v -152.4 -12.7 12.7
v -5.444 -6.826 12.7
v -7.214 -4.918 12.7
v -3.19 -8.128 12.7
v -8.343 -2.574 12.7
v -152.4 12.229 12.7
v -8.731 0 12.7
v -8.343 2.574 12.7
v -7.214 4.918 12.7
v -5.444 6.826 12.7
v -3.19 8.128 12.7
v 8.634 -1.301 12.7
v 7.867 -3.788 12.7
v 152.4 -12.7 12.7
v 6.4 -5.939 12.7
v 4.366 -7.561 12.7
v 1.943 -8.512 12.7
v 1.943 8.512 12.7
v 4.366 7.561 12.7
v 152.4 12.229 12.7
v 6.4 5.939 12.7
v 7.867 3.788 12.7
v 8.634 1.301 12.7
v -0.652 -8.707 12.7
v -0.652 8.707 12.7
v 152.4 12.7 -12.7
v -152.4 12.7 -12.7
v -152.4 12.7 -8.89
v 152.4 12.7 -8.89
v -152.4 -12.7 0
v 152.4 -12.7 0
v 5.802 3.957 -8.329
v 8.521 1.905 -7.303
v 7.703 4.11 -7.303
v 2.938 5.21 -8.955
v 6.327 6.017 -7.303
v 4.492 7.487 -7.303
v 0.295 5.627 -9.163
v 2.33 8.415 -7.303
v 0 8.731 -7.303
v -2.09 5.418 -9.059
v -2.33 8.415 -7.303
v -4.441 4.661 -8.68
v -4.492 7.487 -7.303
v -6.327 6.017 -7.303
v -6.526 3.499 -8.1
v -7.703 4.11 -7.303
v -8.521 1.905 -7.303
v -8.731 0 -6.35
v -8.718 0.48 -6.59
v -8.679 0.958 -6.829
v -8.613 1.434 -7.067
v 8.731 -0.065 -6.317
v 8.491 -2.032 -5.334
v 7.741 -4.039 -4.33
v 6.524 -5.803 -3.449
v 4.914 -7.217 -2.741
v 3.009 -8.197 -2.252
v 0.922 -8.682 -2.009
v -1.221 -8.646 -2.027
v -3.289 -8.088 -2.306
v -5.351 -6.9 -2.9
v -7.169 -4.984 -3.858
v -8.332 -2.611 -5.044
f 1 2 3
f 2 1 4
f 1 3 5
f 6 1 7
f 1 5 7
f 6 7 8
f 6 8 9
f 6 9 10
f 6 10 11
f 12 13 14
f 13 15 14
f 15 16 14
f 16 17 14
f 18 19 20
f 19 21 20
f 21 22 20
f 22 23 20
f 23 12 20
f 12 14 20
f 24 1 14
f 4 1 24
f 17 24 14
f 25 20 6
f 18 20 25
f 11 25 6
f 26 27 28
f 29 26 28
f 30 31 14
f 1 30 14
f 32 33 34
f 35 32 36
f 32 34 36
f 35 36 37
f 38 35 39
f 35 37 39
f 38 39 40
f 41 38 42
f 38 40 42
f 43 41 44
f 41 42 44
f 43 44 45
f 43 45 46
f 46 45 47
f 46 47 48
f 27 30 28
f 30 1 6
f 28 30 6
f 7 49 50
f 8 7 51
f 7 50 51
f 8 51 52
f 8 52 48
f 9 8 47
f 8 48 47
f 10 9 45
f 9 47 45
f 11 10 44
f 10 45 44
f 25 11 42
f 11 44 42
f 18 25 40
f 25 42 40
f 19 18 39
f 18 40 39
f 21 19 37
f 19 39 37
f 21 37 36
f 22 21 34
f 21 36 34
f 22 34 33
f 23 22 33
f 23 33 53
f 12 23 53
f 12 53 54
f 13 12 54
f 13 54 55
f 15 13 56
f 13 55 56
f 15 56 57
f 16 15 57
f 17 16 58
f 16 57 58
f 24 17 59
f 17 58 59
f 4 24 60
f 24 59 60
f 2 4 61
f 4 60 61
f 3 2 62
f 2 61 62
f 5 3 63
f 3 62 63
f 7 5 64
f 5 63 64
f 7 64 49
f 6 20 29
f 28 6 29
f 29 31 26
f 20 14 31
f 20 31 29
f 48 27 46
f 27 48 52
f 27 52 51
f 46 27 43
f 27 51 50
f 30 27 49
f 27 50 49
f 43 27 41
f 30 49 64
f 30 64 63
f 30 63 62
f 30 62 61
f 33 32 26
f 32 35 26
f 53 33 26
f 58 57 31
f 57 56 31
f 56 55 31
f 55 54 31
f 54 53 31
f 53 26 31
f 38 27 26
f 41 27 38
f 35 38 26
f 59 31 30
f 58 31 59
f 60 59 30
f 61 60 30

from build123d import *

# Parameters (mm, degrees)
F0_W     = 25.4
F0_H     = 25.4
F1_DEPTH = 152.4
F3_D     = 17.4625
F3_DEPTH = 20.0025
F3_TIP   = 5.2462642799
F5_DEPTH = 304.801
F7_DEPTH = 304.801


with BuildPart() as f1:
    # F0 (on Right) → F1 (new body, symmetric)
    with BuildSketch(Plane.YZ):
        Rectangle(F0_W, F0_H)
    extrude(amount=F1_DEPTH, both=True)

    # F3
    with Locations(Plane.XY.offset(12.7)):
        with Locations((0, 0)):
            Hole(F3_D / 2, depth=F3_DEPTH)
            with Locations((0, 0, -(F3_DEPTH + F3_TIP / 2))):  # 118° drill point
                Cone(0, F3_D / 2, F3_TIP, mode=Mode.SUBTRACT)

    # F4 (on face) → F5 (cut, through all)
    with BuildSketch(Plane.YZ.offset(152.4)):
        Polygon((12.7, -12.7), (-12.7, 0), (-12.7, -12.7), align=None)
    extrude(amount=-F5_DEPTH, mode=Mode.SUBTRACT)

    # F6 (on face) → F7 (cut, through all)
    with BuildSketch(Plane.YZ.offset(152.4)):
        Polygon((12.2289045241, 12.7), (12.7, -8.89), (12.7, 12.7), align=None)
    extrude(amount=-F7_DEPTH, mode=Mode.SUBTRACT)


solid = f1.part
